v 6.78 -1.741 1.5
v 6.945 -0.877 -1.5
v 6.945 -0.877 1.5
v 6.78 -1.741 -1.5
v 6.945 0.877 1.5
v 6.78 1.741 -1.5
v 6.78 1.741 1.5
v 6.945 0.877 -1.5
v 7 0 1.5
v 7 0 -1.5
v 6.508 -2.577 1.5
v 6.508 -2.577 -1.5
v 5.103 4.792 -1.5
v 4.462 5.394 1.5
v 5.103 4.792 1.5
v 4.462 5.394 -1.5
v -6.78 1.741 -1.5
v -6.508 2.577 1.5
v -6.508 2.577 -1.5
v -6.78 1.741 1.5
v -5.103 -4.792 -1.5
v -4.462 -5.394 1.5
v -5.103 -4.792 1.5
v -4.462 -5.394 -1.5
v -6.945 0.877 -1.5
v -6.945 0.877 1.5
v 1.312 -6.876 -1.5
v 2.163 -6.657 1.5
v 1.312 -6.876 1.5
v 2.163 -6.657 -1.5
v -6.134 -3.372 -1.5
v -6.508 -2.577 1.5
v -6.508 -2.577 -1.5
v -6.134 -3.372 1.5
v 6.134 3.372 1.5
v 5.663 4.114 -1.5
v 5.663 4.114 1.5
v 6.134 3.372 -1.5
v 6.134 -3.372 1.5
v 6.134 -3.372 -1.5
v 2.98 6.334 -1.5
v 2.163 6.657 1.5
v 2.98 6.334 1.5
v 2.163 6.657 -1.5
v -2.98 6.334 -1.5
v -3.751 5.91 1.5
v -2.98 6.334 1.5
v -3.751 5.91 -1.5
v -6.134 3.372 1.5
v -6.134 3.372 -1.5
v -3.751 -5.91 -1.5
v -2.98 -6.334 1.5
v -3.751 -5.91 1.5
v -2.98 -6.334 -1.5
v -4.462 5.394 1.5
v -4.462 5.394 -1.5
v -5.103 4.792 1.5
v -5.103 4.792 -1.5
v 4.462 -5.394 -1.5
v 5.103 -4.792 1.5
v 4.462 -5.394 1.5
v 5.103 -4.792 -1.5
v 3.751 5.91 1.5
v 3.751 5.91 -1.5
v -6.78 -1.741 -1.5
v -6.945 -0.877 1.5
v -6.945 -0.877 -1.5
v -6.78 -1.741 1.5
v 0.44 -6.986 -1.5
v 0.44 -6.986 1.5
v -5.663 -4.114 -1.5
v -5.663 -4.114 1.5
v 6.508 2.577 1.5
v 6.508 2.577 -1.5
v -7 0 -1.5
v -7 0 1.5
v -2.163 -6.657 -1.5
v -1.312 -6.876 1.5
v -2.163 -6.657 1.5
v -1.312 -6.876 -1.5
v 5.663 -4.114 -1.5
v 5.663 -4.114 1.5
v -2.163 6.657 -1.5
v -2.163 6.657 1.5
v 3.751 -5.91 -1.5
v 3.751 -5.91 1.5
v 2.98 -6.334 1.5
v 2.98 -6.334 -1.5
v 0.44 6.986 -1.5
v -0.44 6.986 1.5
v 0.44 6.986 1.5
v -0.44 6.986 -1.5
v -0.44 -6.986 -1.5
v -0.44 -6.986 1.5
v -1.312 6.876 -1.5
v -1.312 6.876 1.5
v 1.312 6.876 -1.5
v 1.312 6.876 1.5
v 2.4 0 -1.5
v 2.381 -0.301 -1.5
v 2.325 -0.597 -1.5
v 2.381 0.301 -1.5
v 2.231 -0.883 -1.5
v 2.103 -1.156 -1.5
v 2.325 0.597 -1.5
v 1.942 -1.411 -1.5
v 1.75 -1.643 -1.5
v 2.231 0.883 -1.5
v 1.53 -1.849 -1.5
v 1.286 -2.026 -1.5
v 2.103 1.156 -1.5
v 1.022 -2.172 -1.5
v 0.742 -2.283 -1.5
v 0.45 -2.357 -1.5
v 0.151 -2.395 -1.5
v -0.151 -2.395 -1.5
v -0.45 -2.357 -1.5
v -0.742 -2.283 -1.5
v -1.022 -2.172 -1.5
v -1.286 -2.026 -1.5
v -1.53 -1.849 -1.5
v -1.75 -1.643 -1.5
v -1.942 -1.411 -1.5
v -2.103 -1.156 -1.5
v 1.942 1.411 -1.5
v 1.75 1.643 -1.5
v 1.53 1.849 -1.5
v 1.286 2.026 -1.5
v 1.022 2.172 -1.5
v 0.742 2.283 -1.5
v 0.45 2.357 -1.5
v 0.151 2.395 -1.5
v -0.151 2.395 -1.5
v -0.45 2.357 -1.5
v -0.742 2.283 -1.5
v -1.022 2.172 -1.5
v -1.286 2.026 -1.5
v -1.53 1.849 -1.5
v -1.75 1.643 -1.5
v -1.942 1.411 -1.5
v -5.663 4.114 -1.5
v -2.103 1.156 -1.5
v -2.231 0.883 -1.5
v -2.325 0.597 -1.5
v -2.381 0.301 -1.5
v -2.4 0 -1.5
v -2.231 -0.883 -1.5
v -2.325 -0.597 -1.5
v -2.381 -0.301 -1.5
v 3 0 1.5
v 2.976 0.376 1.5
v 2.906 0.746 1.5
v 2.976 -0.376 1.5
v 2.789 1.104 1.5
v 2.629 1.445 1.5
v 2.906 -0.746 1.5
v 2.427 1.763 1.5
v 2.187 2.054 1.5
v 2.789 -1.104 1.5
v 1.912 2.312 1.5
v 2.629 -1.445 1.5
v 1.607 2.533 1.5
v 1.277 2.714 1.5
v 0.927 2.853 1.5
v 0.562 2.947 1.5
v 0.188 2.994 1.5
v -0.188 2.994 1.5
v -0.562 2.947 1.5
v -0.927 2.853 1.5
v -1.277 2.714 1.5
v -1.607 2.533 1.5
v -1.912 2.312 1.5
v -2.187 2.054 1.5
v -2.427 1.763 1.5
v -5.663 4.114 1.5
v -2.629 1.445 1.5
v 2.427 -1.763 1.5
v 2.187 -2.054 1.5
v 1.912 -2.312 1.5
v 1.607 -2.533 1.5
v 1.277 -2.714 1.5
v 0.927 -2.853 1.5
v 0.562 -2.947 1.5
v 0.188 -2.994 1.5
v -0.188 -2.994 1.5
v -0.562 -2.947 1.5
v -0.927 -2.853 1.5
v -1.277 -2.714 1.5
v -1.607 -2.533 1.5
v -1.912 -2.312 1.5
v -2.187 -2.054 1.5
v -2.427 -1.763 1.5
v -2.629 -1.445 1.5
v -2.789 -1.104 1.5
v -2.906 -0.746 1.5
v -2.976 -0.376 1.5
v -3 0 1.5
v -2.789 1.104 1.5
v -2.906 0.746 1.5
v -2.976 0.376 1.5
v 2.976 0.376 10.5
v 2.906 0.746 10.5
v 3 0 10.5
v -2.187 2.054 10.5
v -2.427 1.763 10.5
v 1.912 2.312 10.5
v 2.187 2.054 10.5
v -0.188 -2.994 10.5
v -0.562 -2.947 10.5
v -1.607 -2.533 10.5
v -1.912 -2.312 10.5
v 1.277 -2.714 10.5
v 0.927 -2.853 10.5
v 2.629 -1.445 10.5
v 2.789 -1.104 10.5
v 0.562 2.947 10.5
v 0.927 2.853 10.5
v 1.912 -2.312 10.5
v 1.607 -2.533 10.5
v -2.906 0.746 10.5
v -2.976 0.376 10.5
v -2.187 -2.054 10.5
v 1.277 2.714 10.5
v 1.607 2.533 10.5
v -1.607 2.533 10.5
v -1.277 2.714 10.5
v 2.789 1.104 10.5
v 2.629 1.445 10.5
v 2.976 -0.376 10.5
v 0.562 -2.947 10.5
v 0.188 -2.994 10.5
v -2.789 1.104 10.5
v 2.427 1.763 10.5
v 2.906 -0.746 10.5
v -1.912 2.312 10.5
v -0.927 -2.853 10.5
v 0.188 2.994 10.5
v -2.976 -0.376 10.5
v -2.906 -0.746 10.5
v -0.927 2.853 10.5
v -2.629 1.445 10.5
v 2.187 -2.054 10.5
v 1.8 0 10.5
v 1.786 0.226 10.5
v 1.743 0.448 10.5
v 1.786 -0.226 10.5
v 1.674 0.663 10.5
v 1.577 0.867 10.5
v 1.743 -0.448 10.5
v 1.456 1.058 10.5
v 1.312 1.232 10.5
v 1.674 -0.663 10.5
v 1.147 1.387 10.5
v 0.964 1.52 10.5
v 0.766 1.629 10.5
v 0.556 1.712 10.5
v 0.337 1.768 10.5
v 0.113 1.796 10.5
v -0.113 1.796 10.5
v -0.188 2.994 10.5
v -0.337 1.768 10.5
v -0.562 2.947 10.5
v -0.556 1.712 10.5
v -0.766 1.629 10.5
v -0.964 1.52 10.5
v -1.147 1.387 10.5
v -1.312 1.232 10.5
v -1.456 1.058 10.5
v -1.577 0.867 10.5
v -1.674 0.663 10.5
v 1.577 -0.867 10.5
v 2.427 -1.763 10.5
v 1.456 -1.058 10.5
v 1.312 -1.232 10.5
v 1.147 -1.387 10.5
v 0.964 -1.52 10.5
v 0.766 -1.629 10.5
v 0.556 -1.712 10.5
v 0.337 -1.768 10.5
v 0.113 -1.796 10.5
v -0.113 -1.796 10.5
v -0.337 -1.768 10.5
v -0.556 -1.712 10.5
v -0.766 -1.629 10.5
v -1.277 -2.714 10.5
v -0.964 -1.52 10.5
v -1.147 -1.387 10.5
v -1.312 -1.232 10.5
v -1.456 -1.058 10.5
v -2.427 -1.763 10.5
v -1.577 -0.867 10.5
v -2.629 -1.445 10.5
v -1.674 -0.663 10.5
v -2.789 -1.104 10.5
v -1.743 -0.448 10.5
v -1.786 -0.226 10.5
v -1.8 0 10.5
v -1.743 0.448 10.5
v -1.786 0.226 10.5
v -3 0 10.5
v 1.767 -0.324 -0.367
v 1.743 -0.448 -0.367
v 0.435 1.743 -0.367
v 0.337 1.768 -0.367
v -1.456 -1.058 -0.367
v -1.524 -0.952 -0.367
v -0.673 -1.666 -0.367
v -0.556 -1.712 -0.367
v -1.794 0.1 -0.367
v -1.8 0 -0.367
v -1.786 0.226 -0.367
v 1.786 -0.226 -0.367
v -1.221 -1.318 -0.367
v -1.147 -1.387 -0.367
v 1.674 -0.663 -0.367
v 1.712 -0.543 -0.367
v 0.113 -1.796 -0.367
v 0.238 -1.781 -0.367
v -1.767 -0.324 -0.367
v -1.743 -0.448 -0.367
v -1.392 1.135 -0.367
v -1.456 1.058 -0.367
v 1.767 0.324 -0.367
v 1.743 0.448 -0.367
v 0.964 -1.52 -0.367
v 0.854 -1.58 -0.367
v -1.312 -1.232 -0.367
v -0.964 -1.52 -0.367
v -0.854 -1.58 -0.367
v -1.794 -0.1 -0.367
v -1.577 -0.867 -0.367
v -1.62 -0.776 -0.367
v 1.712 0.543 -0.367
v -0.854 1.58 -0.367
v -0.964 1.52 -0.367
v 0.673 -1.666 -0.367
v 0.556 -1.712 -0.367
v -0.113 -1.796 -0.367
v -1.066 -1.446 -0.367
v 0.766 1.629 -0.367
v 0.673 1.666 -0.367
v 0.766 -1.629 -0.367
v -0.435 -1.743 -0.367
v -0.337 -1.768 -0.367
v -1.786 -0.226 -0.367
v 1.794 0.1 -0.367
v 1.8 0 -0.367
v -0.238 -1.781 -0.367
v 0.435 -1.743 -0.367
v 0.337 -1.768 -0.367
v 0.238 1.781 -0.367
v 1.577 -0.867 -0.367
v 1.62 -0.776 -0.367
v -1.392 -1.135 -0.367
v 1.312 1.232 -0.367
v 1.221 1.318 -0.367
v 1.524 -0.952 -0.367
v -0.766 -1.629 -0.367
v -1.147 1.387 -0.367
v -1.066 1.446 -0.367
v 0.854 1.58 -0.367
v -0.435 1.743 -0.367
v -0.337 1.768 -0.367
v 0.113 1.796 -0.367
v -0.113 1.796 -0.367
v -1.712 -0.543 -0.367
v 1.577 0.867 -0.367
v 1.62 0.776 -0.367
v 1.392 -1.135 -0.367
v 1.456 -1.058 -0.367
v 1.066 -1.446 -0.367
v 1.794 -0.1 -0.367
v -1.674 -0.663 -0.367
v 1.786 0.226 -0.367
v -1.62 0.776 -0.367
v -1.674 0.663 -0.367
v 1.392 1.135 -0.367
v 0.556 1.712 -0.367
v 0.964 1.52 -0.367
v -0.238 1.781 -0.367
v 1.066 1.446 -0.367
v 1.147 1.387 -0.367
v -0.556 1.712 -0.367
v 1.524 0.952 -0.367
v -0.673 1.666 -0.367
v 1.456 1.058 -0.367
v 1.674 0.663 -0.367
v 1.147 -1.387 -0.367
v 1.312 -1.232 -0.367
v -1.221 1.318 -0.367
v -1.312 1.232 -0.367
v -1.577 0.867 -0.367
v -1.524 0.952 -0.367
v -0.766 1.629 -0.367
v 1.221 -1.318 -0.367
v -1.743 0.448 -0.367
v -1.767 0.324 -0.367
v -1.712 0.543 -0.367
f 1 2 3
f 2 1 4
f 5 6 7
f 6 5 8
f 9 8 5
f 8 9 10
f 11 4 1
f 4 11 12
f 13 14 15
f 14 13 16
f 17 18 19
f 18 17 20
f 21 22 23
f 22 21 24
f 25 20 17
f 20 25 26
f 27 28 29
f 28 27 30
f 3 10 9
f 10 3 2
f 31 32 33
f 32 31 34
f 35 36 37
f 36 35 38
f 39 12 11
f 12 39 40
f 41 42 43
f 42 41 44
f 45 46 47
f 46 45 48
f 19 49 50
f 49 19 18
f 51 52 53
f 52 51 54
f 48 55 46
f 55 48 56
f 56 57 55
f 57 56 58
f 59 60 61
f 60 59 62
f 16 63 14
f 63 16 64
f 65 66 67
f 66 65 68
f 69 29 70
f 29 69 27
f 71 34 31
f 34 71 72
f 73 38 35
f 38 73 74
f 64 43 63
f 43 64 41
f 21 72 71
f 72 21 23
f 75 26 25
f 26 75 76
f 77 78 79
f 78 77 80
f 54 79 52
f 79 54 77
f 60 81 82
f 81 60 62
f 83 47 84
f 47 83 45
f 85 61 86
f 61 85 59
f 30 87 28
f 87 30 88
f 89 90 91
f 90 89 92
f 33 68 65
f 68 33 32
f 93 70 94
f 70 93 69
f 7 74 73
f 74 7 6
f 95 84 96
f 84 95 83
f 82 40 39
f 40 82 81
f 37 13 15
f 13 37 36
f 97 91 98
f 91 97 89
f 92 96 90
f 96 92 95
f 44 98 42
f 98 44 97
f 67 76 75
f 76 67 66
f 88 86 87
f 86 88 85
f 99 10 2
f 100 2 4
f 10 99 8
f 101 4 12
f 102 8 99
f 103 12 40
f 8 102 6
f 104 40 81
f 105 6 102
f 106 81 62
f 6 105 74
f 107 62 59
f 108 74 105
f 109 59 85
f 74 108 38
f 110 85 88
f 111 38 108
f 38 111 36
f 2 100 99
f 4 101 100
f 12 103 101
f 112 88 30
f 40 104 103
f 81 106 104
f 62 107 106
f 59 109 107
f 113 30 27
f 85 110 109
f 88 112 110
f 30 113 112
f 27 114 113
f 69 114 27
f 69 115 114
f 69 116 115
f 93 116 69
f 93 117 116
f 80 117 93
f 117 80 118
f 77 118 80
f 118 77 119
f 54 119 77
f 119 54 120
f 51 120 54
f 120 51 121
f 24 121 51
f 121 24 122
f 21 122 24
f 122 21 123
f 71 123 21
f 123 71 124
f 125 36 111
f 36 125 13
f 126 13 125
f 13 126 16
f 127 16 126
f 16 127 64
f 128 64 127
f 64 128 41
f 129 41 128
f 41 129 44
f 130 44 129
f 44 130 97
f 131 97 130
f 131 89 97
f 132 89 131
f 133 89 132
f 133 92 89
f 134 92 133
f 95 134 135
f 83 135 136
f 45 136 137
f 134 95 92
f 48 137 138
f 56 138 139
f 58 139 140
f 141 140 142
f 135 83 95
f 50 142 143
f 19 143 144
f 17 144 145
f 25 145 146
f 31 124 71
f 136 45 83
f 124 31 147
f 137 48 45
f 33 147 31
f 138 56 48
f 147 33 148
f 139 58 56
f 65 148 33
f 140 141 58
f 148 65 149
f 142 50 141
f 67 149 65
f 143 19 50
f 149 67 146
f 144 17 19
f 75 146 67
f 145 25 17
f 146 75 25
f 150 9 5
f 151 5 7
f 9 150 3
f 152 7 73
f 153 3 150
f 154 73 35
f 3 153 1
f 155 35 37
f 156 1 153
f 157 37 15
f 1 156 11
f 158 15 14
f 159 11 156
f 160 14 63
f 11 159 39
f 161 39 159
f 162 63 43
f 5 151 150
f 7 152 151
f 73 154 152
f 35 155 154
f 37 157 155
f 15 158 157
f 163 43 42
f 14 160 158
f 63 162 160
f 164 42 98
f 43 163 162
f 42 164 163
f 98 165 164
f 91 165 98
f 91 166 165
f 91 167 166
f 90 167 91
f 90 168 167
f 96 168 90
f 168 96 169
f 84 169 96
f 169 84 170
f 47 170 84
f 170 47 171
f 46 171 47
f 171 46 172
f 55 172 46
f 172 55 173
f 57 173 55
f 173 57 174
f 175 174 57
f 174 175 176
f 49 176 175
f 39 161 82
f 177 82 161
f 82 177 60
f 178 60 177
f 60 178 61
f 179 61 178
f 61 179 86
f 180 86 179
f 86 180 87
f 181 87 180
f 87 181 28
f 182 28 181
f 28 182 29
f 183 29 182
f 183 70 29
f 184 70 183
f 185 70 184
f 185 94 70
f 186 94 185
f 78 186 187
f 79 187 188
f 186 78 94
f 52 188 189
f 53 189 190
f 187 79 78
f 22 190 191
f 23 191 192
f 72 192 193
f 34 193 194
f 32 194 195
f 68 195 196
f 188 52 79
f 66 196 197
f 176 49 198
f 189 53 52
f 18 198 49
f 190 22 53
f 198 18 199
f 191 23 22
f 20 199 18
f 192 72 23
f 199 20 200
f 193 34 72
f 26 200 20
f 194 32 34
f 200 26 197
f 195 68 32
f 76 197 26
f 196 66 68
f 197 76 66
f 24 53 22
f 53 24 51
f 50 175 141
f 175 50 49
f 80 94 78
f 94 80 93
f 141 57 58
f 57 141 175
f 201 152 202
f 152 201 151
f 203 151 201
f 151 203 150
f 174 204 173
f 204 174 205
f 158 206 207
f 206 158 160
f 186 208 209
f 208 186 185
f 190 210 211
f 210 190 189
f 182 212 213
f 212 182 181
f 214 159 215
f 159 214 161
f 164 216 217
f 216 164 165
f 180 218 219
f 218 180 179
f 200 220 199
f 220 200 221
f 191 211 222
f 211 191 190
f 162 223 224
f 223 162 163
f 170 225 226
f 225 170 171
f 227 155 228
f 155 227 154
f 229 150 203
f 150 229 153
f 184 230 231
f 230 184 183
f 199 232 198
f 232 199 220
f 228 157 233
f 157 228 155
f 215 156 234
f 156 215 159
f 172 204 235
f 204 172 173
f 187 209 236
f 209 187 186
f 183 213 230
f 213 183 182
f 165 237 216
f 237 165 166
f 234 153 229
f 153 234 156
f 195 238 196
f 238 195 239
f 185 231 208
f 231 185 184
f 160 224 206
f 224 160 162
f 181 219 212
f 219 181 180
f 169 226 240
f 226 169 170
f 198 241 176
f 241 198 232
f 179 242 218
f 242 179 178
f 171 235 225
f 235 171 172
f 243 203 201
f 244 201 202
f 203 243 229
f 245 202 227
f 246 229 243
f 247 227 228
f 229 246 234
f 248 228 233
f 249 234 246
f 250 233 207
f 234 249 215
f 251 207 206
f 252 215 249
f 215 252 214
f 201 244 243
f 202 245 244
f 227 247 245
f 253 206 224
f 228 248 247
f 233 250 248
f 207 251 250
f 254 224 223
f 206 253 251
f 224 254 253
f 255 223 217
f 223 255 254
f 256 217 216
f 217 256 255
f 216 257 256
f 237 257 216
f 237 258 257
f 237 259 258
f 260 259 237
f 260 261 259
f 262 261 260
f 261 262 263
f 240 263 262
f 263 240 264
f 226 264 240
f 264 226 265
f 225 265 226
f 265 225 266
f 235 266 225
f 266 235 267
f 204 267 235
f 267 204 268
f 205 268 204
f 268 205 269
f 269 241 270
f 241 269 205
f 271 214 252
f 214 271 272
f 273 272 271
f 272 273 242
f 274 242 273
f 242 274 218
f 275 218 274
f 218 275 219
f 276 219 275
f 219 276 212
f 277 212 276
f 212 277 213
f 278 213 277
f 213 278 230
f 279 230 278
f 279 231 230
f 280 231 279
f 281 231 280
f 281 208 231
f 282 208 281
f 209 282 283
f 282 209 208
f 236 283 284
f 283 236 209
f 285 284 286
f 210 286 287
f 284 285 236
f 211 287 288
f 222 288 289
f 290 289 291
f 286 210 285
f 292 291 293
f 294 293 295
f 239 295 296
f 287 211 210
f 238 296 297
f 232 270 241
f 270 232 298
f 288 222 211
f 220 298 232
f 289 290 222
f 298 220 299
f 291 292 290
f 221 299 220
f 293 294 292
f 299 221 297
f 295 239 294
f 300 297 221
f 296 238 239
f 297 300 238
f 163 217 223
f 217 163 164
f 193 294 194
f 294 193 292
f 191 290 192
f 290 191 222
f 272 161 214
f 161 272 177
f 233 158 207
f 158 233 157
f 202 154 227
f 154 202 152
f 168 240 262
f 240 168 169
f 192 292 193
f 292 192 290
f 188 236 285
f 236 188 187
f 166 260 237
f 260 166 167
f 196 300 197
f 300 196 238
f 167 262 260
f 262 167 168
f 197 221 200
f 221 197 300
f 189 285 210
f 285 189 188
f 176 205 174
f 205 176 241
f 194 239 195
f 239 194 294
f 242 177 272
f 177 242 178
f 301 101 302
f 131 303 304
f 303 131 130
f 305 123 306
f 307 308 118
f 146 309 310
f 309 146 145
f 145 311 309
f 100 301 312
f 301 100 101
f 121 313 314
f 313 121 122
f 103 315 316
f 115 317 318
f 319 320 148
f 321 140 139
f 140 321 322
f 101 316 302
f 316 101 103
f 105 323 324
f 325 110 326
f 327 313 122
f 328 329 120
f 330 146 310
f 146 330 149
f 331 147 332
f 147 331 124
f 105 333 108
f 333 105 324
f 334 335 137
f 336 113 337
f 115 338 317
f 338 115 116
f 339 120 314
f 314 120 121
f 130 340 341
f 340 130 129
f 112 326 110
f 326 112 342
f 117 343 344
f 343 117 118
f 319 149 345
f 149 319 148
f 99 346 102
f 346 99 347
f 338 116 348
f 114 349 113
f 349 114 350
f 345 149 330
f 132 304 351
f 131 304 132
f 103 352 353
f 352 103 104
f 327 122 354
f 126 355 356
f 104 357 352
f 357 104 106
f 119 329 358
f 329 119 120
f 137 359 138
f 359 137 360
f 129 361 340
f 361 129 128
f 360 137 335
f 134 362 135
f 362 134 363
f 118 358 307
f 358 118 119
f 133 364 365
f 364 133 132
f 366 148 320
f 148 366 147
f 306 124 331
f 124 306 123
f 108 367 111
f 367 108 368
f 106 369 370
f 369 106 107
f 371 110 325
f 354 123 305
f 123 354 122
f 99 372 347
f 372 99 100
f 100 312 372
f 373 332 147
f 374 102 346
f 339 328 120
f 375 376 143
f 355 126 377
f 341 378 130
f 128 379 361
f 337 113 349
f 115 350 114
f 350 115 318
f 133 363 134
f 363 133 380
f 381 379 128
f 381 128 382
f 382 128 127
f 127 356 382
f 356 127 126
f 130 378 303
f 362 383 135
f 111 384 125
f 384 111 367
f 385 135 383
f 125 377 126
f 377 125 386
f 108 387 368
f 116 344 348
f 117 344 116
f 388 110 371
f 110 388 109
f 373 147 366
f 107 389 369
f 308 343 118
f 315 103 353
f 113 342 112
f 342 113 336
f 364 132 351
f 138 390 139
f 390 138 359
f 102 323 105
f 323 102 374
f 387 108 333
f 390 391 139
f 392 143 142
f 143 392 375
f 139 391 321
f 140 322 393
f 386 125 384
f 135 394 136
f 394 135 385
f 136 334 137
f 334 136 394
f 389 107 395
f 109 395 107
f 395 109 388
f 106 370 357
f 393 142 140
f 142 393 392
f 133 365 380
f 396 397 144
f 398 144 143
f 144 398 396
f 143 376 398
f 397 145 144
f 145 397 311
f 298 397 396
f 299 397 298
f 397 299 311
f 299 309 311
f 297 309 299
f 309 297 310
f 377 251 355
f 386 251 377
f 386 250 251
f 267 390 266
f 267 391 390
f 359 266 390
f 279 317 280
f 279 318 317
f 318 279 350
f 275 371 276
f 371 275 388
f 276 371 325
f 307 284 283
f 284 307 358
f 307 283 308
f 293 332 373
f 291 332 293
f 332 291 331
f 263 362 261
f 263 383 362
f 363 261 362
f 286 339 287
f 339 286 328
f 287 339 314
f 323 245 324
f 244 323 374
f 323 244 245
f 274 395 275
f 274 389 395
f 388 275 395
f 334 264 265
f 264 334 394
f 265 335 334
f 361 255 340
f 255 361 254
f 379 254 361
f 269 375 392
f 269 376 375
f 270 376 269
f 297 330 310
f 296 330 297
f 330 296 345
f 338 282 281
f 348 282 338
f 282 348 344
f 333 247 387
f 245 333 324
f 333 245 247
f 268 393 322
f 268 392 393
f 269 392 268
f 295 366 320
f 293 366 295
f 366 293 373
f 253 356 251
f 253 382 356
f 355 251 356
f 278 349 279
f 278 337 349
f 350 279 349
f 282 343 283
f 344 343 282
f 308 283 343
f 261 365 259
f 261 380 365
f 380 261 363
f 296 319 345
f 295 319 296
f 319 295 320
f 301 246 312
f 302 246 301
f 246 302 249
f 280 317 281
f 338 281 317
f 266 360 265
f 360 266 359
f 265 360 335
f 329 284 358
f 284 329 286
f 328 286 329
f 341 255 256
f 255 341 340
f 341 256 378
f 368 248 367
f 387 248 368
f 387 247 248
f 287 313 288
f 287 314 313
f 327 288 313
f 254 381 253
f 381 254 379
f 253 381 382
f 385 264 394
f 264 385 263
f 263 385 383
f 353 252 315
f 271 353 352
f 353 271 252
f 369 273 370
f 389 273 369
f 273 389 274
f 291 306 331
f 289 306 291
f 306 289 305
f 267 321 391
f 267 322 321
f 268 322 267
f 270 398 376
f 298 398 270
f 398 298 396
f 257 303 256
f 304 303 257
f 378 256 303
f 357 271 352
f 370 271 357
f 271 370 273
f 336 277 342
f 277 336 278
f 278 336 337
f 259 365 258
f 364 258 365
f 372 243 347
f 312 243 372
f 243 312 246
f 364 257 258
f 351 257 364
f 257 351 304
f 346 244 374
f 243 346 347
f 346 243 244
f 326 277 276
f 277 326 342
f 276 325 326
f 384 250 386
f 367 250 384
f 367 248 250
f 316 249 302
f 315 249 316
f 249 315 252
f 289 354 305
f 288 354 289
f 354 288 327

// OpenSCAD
$fn = 50;


difference() {
	union() {
		translate(v = [0, 0, -1.5000000000]) {
			cylinder(h = 3, r = 7.0000000000);
		}
		translate(v = [0, 0, -1.5000000000]) {
			cylinder(h = 12, r = 3.0000000000);
		}
	}
	union() {
		translate(v = [0, 0, -1.5000000000]) {
			rotate(a = [0, 180, 0]) {
				difference() {
					union() {
						translate(v = [0, 0, -1.7000000000]) {
							cylinder(h = 1.7000000000, r1 = 1.5000000000, r2 = 2.4000000000);
						}
						translate(v = [0, 0, -12.0000000000]) {
							cylinder(h = 12, r = 1.5000000000);
						}
						translate(v = [0, 0, -12.0000000000]) {
							cylinder(h = 12, r = 1.8000000000);
						}
						translate(v = [0, 0, -12.0000000000]) {
							cylinder(h = 12, r = 1.5000000000);
						}
					}
					union();
				}
			}
		}
		translate(v = [0, 0, -50.0000000000]) {
			cylinder(h = 100, r = 1.5000000000);
		}
	}
}
